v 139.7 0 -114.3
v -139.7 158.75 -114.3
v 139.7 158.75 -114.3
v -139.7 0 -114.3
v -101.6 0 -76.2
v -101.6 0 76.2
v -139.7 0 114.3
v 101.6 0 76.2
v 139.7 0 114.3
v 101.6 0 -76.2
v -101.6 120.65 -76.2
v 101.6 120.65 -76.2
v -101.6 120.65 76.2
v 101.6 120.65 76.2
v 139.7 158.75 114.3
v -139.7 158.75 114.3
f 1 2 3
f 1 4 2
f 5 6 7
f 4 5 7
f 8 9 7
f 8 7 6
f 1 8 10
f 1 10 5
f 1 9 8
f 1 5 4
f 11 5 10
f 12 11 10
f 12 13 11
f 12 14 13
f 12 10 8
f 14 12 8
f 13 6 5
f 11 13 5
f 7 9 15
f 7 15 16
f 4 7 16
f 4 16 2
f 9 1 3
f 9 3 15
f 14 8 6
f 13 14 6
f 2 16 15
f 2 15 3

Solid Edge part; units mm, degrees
sketch "Sketch1" plane through (0, 0, 0) normal (0, -1, 0) x (1, 0, 0)
  line L0 (139.7, 114.3) -> (-139.7, 114.3)
  line L1 (-139.7, 114.3) -> (-139.7, -114.3)
  line L2 (-139.7, -114.3) -> (139.7, -114.3)
  line L3 (139.7, -114.3) -> (139.7, 114.3)
extrude "Protrusion1" add sketch "Sketch1" against normal blind 158.75
shell "Thinwall_1" thickness 38.1 removed faces 1 at (-90.3393, 0, 78.486)
